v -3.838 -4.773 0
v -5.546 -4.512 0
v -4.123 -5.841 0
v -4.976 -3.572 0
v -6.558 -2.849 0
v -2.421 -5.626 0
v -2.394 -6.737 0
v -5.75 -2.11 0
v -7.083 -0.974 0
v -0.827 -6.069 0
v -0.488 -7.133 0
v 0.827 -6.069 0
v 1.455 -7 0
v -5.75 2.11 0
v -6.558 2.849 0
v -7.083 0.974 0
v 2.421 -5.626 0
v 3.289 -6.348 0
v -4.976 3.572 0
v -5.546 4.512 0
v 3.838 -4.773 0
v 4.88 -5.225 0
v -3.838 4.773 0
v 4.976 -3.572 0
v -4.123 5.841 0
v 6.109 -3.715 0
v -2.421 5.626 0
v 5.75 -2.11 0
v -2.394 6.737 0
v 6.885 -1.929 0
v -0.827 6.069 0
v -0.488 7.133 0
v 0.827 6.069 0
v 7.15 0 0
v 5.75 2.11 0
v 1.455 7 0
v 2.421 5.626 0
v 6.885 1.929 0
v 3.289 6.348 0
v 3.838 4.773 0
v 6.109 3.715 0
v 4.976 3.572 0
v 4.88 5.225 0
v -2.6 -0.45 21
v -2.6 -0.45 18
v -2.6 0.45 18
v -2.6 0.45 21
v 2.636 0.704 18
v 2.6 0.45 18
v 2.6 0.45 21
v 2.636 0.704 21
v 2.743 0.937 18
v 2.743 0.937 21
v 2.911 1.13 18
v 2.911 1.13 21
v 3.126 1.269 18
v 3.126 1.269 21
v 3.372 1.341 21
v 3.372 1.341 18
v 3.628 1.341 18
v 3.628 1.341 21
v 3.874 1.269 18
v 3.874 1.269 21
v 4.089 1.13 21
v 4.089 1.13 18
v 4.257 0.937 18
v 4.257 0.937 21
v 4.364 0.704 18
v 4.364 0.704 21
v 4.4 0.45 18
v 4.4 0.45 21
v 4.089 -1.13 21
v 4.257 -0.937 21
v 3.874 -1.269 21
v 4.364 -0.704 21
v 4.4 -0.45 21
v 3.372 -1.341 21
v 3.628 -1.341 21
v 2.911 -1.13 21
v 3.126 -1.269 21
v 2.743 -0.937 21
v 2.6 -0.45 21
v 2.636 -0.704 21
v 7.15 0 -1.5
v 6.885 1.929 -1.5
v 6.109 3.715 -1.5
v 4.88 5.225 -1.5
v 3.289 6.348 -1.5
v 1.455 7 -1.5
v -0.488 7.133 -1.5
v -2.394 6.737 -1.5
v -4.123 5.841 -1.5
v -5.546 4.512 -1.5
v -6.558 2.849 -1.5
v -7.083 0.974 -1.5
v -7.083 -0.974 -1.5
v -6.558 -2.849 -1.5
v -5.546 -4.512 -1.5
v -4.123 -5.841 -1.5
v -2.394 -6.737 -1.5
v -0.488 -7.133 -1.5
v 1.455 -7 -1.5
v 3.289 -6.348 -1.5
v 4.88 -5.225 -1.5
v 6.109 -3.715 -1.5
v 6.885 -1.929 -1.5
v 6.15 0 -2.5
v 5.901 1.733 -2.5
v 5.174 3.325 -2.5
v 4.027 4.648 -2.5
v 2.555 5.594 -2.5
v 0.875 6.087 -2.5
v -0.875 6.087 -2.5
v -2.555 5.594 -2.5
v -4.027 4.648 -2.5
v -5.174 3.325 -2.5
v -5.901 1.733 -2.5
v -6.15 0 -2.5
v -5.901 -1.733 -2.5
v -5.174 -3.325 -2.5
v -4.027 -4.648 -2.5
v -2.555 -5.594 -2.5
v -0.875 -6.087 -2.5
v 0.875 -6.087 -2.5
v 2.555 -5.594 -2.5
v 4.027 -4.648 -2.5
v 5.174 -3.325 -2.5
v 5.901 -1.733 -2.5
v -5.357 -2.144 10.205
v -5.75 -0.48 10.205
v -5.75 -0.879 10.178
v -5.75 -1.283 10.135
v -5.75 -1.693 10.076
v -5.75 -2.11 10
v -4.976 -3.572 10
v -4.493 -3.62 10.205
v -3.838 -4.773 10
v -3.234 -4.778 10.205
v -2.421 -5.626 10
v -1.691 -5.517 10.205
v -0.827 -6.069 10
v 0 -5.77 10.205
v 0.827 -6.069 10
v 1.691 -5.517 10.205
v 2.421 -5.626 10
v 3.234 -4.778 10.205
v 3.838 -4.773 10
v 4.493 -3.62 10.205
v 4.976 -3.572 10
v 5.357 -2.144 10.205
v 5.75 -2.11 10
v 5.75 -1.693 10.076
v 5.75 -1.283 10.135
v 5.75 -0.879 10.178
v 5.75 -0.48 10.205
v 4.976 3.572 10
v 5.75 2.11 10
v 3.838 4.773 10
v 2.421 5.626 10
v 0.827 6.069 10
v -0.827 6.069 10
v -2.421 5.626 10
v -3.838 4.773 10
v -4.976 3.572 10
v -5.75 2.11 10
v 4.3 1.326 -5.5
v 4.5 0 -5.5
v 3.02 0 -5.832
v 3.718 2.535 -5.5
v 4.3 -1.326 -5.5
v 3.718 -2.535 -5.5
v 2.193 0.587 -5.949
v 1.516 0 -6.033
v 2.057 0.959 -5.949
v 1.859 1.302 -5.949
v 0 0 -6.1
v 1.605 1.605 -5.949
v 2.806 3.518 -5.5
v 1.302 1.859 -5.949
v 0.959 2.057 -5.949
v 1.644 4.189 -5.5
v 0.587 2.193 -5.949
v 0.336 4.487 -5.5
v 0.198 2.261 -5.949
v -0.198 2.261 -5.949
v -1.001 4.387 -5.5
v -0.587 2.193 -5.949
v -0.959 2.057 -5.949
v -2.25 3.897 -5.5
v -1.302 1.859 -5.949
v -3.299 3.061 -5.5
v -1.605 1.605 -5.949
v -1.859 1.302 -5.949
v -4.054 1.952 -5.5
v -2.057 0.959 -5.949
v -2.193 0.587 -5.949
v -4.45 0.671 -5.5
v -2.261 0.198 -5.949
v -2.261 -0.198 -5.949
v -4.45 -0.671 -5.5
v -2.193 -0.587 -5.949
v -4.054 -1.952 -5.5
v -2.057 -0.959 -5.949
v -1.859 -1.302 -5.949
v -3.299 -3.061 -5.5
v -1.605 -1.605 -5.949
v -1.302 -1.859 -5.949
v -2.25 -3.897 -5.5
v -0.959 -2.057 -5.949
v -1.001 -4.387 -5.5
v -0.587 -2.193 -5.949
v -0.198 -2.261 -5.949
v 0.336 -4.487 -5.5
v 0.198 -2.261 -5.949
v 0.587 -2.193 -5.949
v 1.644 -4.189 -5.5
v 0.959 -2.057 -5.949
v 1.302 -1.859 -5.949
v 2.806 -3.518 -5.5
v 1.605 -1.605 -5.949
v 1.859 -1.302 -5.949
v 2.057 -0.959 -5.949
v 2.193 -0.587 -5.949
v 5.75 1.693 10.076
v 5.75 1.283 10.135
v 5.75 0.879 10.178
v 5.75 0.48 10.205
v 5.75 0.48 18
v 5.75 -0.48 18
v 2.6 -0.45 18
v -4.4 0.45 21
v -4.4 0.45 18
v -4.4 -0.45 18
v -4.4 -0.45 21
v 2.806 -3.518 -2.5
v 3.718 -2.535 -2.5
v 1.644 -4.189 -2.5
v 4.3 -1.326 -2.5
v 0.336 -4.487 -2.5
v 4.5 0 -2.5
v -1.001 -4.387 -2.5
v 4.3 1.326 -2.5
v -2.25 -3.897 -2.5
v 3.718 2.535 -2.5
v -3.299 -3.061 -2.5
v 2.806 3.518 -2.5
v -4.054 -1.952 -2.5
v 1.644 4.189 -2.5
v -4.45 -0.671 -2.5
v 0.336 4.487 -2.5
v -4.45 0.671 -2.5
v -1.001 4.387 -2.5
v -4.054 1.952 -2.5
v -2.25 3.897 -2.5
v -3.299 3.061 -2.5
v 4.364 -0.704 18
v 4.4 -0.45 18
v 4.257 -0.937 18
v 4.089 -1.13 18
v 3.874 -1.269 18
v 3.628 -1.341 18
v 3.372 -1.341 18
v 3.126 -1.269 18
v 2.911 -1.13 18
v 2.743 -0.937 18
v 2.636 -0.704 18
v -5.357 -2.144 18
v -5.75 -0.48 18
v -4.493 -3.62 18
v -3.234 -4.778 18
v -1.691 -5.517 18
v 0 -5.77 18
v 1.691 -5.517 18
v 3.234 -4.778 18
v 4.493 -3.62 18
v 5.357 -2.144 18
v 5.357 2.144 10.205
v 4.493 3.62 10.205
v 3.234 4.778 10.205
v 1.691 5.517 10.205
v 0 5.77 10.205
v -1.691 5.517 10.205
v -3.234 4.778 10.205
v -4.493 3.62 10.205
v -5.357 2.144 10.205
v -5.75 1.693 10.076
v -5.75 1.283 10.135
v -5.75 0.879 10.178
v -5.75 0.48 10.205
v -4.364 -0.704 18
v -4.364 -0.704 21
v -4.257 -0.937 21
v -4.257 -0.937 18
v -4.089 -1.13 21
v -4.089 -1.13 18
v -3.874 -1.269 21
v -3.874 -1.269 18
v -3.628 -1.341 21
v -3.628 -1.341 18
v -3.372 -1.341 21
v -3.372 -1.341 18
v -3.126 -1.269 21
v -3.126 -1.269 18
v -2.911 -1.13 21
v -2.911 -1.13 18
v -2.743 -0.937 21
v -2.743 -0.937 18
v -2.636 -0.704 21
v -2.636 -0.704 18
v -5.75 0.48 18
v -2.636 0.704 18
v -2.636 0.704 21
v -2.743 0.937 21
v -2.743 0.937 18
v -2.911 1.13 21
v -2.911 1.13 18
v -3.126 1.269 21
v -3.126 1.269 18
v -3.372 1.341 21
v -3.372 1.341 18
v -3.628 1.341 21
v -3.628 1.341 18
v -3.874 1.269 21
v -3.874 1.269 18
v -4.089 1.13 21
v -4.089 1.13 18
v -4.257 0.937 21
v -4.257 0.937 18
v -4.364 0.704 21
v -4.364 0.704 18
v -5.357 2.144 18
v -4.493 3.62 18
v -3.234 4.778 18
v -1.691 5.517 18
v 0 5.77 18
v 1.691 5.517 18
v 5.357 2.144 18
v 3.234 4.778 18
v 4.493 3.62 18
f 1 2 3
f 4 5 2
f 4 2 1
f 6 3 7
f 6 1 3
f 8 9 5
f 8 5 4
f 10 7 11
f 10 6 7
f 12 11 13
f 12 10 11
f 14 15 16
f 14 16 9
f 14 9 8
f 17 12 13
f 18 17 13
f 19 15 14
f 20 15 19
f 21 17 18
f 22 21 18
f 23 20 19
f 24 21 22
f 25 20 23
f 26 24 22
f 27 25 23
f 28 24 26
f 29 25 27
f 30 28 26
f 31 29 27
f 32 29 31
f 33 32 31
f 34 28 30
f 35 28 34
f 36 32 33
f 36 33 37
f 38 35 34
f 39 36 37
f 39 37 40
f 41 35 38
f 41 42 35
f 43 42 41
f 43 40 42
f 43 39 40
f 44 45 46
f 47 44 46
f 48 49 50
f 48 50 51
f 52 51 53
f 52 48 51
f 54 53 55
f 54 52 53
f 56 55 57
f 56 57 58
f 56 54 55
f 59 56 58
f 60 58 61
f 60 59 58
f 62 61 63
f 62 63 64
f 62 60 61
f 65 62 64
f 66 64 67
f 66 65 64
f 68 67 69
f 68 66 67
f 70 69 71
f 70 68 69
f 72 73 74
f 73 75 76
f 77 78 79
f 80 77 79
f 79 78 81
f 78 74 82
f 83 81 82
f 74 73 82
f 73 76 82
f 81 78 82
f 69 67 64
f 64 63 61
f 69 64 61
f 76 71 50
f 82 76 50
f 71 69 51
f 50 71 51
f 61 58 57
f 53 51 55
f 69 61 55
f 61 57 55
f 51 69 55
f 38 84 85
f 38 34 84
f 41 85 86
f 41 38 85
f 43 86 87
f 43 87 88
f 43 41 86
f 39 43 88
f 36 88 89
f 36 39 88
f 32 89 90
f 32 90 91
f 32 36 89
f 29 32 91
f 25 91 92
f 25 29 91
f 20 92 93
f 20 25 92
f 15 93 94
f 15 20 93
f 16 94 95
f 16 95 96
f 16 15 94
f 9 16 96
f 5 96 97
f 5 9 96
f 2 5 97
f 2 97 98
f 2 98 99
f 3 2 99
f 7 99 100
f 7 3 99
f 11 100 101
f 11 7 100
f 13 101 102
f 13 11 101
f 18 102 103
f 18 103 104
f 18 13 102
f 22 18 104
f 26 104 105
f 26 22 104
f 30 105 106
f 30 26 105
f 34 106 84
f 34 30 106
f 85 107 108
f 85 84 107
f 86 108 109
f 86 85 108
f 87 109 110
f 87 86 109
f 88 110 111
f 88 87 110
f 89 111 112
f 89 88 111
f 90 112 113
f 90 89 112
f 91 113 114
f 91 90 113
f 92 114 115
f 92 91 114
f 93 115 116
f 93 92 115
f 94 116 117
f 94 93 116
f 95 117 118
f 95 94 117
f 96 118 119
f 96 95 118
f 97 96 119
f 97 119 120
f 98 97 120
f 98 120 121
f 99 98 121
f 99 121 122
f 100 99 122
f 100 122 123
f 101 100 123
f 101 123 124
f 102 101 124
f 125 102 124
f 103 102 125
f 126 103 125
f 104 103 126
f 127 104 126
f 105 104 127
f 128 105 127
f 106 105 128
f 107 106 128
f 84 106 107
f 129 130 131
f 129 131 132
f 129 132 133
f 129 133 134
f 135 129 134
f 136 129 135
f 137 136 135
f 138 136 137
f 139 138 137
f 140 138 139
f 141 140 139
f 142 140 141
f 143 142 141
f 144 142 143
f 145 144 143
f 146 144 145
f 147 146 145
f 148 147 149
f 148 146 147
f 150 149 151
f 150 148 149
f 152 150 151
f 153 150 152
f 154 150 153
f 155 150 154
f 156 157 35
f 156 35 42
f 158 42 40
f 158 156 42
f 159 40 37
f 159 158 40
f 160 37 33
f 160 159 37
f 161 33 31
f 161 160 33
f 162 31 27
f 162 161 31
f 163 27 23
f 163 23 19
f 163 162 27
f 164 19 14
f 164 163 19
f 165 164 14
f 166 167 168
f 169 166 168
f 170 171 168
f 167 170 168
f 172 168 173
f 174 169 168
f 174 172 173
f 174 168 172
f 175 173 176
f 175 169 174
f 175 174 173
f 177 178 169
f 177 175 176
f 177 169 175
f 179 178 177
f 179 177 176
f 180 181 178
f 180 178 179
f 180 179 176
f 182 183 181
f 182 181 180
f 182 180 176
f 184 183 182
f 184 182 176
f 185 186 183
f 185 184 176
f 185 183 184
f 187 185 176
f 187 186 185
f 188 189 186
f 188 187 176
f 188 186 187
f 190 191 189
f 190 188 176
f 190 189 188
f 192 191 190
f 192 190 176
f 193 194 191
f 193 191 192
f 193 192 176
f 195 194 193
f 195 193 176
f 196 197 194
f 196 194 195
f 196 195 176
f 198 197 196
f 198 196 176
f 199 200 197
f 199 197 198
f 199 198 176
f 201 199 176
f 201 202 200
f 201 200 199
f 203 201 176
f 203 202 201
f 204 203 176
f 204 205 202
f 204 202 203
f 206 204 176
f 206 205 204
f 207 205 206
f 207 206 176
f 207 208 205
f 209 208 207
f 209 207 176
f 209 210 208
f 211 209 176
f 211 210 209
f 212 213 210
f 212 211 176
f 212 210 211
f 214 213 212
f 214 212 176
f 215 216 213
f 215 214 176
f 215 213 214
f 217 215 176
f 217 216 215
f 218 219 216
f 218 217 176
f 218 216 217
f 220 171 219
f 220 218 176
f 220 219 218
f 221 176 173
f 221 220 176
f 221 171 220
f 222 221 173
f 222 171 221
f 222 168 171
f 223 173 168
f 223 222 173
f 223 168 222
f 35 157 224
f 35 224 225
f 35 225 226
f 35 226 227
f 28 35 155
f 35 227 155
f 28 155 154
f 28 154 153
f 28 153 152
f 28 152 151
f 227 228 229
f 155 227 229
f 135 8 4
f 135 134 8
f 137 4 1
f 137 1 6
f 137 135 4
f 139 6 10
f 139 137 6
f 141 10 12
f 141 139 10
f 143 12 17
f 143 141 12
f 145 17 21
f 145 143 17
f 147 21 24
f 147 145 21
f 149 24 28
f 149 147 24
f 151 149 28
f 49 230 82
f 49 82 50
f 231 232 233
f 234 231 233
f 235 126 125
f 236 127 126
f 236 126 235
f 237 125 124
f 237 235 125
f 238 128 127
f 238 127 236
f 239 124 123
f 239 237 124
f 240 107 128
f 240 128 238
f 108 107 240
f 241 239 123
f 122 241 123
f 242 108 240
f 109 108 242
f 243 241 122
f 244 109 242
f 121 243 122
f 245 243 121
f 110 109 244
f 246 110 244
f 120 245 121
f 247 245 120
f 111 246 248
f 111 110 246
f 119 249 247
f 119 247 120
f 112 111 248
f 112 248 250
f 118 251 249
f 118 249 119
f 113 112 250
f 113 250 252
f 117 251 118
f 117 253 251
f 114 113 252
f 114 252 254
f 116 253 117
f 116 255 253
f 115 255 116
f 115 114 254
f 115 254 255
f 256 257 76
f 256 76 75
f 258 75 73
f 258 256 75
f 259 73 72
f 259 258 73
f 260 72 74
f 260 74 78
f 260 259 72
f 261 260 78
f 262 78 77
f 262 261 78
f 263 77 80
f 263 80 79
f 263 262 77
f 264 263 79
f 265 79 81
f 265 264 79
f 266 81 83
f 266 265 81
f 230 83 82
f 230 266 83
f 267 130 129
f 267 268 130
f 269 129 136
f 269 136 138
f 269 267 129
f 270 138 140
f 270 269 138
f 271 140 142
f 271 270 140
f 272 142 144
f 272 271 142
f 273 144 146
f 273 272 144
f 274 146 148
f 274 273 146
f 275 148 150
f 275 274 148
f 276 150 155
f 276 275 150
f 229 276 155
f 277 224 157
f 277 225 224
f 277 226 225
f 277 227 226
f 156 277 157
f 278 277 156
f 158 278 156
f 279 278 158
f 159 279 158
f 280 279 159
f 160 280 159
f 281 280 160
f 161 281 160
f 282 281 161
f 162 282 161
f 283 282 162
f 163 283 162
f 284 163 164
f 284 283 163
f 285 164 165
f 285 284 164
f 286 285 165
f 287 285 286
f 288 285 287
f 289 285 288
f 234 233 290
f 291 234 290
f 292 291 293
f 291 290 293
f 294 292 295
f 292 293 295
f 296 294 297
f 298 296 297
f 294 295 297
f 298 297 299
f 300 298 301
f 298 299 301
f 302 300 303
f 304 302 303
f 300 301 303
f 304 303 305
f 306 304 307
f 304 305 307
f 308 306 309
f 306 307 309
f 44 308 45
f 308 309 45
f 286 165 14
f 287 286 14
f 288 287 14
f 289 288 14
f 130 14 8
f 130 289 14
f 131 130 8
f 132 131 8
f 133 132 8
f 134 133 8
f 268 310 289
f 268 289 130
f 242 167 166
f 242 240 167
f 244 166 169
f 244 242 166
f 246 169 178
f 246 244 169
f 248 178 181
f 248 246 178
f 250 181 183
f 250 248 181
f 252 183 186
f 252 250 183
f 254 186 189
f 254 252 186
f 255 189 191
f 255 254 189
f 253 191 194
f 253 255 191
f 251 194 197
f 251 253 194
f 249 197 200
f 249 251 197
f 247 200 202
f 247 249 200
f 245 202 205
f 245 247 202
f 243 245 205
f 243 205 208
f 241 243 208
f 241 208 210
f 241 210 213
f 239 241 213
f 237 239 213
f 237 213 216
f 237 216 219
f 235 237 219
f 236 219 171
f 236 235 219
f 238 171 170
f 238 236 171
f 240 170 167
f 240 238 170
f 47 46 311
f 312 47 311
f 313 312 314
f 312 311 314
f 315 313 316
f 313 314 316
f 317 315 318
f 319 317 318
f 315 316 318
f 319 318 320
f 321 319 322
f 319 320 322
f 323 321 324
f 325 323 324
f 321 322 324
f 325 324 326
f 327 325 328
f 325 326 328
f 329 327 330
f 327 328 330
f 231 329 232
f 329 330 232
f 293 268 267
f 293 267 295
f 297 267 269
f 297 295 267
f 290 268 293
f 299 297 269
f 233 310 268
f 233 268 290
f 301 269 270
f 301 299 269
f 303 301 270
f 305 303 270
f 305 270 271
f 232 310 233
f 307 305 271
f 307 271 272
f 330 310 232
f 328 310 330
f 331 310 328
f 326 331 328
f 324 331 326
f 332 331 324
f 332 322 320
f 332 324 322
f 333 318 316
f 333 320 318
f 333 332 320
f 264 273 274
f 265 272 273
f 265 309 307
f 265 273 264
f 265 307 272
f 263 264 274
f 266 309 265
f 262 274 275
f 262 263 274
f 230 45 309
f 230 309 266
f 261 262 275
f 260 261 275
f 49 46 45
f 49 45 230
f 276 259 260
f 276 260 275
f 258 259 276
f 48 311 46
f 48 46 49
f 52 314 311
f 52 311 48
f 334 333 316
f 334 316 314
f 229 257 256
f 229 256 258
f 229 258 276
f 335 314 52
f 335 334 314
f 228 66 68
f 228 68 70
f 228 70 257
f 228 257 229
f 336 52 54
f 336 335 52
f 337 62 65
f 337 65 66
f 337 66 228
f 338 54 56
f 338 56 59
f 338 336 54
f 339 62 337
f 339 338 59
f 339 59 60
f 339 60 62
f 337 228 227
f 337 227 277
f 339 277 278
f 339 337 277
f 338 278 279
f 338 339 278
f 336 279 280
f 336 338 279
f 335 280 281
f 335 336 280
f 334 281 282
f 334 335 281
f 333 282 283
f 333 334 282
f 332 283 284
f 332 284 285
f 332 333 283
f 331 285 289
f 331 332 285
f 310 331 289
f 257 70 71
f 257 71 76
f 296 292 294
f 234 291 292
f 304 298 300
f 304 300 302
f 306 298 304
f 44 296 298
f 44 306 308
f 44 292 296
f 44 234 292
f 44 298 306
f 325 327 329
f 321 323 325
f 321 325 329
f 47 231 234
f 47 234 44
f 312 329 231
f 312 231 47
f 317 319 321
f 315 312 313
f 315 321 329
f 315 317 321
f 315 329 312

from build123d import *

# Parameters (mm, degrees)
BOSS_EXTRUDE1_DEPTH = 3
CUT_EXTRUDE1_DEPTH  = 18


with BuildPart() as part:
    # Sketch1 → Revolve1 (revolve)
    with BuildSketch(Plane(origin=(0, 0, 0), x_dir=(1, 0, 0), z_dir=(0, 1, 0))):
        with BuildLine():
            Line((7.15, 0), (6.125, 0))
            Line((6.125, 0), (6.125, -10))
            Line((6.125, -10), (5.77, -10.204959346))
            Line((5.77, -10.204959346), (5.77, -18))
            Line((5.77, -18), (0, -18))
            Line((0, -18), (0, 6.1))
            ThreePointArc((0, 6.1), (2.269911893, 5.949339194), (4.5, 5.5))
            Line((4.5, 5.5), (4.5, 2.5))
            Line((4.5, 2.5), (6.15, 2.5))
            Line((6.15, 2.5), (7.15, 1.5))
            Line((7.15, 1.5), (7.15, 0))
        make_face()
    revolve(axis=Axis((0, 0, -49.656832942), (0, 0, 1)))

    # Sketch2 → Boss-Extrude1 (add)
    with BuildSketch(Plane.XY.offset(18)):
        with BuildLine():
            Line((2.6, -0.45), (2.6, 0.45))
            ThreePointArc((2.6, 0.45), (3.5, 1.35), (4.4, 0.45))
            Line((4.4, 0.45), (4.4, -0.45))
            ThreePointArc((4.4, -0.45), (3.5, -1.35), (2.6, -0.45))
        make_face()
    boss_extrude1 = extrude(amount=BOSS_EXTRUDE1_DEPTH)

    # Mirror1: Boss-Extrude1 across plane
    add(boss_extrude1.mirror(Plane(origin=(0, 0, 0), x_dir=(0, 0, 1), z_dir=(1, 0, 0))))

    # Sketch3 → Cut-Extrude1 (cut)
    with BuildSketch(Plane.XY.offset(18)):
        with BuildLine():
            Line((5.75, 2.110242877), (5.75, -2.110242877))
            ThreePointArc((5.75, -2.110242877), (6.125, 0), (5.75, 2.110242877))
        make_face()
        with BuildLine():
            Line((-5.75, 2.110242877), (-5.75, -2.110242877))
            ThreePointArc((-5.75, -2.110242877), (-6.125, 0), (-5.75, 2.110242877))
        make_face()
    extrude(amount=-CUT_EXTRUDE1_DEPTH, mode=Mode.SUBTRACT)


solid = part.part
